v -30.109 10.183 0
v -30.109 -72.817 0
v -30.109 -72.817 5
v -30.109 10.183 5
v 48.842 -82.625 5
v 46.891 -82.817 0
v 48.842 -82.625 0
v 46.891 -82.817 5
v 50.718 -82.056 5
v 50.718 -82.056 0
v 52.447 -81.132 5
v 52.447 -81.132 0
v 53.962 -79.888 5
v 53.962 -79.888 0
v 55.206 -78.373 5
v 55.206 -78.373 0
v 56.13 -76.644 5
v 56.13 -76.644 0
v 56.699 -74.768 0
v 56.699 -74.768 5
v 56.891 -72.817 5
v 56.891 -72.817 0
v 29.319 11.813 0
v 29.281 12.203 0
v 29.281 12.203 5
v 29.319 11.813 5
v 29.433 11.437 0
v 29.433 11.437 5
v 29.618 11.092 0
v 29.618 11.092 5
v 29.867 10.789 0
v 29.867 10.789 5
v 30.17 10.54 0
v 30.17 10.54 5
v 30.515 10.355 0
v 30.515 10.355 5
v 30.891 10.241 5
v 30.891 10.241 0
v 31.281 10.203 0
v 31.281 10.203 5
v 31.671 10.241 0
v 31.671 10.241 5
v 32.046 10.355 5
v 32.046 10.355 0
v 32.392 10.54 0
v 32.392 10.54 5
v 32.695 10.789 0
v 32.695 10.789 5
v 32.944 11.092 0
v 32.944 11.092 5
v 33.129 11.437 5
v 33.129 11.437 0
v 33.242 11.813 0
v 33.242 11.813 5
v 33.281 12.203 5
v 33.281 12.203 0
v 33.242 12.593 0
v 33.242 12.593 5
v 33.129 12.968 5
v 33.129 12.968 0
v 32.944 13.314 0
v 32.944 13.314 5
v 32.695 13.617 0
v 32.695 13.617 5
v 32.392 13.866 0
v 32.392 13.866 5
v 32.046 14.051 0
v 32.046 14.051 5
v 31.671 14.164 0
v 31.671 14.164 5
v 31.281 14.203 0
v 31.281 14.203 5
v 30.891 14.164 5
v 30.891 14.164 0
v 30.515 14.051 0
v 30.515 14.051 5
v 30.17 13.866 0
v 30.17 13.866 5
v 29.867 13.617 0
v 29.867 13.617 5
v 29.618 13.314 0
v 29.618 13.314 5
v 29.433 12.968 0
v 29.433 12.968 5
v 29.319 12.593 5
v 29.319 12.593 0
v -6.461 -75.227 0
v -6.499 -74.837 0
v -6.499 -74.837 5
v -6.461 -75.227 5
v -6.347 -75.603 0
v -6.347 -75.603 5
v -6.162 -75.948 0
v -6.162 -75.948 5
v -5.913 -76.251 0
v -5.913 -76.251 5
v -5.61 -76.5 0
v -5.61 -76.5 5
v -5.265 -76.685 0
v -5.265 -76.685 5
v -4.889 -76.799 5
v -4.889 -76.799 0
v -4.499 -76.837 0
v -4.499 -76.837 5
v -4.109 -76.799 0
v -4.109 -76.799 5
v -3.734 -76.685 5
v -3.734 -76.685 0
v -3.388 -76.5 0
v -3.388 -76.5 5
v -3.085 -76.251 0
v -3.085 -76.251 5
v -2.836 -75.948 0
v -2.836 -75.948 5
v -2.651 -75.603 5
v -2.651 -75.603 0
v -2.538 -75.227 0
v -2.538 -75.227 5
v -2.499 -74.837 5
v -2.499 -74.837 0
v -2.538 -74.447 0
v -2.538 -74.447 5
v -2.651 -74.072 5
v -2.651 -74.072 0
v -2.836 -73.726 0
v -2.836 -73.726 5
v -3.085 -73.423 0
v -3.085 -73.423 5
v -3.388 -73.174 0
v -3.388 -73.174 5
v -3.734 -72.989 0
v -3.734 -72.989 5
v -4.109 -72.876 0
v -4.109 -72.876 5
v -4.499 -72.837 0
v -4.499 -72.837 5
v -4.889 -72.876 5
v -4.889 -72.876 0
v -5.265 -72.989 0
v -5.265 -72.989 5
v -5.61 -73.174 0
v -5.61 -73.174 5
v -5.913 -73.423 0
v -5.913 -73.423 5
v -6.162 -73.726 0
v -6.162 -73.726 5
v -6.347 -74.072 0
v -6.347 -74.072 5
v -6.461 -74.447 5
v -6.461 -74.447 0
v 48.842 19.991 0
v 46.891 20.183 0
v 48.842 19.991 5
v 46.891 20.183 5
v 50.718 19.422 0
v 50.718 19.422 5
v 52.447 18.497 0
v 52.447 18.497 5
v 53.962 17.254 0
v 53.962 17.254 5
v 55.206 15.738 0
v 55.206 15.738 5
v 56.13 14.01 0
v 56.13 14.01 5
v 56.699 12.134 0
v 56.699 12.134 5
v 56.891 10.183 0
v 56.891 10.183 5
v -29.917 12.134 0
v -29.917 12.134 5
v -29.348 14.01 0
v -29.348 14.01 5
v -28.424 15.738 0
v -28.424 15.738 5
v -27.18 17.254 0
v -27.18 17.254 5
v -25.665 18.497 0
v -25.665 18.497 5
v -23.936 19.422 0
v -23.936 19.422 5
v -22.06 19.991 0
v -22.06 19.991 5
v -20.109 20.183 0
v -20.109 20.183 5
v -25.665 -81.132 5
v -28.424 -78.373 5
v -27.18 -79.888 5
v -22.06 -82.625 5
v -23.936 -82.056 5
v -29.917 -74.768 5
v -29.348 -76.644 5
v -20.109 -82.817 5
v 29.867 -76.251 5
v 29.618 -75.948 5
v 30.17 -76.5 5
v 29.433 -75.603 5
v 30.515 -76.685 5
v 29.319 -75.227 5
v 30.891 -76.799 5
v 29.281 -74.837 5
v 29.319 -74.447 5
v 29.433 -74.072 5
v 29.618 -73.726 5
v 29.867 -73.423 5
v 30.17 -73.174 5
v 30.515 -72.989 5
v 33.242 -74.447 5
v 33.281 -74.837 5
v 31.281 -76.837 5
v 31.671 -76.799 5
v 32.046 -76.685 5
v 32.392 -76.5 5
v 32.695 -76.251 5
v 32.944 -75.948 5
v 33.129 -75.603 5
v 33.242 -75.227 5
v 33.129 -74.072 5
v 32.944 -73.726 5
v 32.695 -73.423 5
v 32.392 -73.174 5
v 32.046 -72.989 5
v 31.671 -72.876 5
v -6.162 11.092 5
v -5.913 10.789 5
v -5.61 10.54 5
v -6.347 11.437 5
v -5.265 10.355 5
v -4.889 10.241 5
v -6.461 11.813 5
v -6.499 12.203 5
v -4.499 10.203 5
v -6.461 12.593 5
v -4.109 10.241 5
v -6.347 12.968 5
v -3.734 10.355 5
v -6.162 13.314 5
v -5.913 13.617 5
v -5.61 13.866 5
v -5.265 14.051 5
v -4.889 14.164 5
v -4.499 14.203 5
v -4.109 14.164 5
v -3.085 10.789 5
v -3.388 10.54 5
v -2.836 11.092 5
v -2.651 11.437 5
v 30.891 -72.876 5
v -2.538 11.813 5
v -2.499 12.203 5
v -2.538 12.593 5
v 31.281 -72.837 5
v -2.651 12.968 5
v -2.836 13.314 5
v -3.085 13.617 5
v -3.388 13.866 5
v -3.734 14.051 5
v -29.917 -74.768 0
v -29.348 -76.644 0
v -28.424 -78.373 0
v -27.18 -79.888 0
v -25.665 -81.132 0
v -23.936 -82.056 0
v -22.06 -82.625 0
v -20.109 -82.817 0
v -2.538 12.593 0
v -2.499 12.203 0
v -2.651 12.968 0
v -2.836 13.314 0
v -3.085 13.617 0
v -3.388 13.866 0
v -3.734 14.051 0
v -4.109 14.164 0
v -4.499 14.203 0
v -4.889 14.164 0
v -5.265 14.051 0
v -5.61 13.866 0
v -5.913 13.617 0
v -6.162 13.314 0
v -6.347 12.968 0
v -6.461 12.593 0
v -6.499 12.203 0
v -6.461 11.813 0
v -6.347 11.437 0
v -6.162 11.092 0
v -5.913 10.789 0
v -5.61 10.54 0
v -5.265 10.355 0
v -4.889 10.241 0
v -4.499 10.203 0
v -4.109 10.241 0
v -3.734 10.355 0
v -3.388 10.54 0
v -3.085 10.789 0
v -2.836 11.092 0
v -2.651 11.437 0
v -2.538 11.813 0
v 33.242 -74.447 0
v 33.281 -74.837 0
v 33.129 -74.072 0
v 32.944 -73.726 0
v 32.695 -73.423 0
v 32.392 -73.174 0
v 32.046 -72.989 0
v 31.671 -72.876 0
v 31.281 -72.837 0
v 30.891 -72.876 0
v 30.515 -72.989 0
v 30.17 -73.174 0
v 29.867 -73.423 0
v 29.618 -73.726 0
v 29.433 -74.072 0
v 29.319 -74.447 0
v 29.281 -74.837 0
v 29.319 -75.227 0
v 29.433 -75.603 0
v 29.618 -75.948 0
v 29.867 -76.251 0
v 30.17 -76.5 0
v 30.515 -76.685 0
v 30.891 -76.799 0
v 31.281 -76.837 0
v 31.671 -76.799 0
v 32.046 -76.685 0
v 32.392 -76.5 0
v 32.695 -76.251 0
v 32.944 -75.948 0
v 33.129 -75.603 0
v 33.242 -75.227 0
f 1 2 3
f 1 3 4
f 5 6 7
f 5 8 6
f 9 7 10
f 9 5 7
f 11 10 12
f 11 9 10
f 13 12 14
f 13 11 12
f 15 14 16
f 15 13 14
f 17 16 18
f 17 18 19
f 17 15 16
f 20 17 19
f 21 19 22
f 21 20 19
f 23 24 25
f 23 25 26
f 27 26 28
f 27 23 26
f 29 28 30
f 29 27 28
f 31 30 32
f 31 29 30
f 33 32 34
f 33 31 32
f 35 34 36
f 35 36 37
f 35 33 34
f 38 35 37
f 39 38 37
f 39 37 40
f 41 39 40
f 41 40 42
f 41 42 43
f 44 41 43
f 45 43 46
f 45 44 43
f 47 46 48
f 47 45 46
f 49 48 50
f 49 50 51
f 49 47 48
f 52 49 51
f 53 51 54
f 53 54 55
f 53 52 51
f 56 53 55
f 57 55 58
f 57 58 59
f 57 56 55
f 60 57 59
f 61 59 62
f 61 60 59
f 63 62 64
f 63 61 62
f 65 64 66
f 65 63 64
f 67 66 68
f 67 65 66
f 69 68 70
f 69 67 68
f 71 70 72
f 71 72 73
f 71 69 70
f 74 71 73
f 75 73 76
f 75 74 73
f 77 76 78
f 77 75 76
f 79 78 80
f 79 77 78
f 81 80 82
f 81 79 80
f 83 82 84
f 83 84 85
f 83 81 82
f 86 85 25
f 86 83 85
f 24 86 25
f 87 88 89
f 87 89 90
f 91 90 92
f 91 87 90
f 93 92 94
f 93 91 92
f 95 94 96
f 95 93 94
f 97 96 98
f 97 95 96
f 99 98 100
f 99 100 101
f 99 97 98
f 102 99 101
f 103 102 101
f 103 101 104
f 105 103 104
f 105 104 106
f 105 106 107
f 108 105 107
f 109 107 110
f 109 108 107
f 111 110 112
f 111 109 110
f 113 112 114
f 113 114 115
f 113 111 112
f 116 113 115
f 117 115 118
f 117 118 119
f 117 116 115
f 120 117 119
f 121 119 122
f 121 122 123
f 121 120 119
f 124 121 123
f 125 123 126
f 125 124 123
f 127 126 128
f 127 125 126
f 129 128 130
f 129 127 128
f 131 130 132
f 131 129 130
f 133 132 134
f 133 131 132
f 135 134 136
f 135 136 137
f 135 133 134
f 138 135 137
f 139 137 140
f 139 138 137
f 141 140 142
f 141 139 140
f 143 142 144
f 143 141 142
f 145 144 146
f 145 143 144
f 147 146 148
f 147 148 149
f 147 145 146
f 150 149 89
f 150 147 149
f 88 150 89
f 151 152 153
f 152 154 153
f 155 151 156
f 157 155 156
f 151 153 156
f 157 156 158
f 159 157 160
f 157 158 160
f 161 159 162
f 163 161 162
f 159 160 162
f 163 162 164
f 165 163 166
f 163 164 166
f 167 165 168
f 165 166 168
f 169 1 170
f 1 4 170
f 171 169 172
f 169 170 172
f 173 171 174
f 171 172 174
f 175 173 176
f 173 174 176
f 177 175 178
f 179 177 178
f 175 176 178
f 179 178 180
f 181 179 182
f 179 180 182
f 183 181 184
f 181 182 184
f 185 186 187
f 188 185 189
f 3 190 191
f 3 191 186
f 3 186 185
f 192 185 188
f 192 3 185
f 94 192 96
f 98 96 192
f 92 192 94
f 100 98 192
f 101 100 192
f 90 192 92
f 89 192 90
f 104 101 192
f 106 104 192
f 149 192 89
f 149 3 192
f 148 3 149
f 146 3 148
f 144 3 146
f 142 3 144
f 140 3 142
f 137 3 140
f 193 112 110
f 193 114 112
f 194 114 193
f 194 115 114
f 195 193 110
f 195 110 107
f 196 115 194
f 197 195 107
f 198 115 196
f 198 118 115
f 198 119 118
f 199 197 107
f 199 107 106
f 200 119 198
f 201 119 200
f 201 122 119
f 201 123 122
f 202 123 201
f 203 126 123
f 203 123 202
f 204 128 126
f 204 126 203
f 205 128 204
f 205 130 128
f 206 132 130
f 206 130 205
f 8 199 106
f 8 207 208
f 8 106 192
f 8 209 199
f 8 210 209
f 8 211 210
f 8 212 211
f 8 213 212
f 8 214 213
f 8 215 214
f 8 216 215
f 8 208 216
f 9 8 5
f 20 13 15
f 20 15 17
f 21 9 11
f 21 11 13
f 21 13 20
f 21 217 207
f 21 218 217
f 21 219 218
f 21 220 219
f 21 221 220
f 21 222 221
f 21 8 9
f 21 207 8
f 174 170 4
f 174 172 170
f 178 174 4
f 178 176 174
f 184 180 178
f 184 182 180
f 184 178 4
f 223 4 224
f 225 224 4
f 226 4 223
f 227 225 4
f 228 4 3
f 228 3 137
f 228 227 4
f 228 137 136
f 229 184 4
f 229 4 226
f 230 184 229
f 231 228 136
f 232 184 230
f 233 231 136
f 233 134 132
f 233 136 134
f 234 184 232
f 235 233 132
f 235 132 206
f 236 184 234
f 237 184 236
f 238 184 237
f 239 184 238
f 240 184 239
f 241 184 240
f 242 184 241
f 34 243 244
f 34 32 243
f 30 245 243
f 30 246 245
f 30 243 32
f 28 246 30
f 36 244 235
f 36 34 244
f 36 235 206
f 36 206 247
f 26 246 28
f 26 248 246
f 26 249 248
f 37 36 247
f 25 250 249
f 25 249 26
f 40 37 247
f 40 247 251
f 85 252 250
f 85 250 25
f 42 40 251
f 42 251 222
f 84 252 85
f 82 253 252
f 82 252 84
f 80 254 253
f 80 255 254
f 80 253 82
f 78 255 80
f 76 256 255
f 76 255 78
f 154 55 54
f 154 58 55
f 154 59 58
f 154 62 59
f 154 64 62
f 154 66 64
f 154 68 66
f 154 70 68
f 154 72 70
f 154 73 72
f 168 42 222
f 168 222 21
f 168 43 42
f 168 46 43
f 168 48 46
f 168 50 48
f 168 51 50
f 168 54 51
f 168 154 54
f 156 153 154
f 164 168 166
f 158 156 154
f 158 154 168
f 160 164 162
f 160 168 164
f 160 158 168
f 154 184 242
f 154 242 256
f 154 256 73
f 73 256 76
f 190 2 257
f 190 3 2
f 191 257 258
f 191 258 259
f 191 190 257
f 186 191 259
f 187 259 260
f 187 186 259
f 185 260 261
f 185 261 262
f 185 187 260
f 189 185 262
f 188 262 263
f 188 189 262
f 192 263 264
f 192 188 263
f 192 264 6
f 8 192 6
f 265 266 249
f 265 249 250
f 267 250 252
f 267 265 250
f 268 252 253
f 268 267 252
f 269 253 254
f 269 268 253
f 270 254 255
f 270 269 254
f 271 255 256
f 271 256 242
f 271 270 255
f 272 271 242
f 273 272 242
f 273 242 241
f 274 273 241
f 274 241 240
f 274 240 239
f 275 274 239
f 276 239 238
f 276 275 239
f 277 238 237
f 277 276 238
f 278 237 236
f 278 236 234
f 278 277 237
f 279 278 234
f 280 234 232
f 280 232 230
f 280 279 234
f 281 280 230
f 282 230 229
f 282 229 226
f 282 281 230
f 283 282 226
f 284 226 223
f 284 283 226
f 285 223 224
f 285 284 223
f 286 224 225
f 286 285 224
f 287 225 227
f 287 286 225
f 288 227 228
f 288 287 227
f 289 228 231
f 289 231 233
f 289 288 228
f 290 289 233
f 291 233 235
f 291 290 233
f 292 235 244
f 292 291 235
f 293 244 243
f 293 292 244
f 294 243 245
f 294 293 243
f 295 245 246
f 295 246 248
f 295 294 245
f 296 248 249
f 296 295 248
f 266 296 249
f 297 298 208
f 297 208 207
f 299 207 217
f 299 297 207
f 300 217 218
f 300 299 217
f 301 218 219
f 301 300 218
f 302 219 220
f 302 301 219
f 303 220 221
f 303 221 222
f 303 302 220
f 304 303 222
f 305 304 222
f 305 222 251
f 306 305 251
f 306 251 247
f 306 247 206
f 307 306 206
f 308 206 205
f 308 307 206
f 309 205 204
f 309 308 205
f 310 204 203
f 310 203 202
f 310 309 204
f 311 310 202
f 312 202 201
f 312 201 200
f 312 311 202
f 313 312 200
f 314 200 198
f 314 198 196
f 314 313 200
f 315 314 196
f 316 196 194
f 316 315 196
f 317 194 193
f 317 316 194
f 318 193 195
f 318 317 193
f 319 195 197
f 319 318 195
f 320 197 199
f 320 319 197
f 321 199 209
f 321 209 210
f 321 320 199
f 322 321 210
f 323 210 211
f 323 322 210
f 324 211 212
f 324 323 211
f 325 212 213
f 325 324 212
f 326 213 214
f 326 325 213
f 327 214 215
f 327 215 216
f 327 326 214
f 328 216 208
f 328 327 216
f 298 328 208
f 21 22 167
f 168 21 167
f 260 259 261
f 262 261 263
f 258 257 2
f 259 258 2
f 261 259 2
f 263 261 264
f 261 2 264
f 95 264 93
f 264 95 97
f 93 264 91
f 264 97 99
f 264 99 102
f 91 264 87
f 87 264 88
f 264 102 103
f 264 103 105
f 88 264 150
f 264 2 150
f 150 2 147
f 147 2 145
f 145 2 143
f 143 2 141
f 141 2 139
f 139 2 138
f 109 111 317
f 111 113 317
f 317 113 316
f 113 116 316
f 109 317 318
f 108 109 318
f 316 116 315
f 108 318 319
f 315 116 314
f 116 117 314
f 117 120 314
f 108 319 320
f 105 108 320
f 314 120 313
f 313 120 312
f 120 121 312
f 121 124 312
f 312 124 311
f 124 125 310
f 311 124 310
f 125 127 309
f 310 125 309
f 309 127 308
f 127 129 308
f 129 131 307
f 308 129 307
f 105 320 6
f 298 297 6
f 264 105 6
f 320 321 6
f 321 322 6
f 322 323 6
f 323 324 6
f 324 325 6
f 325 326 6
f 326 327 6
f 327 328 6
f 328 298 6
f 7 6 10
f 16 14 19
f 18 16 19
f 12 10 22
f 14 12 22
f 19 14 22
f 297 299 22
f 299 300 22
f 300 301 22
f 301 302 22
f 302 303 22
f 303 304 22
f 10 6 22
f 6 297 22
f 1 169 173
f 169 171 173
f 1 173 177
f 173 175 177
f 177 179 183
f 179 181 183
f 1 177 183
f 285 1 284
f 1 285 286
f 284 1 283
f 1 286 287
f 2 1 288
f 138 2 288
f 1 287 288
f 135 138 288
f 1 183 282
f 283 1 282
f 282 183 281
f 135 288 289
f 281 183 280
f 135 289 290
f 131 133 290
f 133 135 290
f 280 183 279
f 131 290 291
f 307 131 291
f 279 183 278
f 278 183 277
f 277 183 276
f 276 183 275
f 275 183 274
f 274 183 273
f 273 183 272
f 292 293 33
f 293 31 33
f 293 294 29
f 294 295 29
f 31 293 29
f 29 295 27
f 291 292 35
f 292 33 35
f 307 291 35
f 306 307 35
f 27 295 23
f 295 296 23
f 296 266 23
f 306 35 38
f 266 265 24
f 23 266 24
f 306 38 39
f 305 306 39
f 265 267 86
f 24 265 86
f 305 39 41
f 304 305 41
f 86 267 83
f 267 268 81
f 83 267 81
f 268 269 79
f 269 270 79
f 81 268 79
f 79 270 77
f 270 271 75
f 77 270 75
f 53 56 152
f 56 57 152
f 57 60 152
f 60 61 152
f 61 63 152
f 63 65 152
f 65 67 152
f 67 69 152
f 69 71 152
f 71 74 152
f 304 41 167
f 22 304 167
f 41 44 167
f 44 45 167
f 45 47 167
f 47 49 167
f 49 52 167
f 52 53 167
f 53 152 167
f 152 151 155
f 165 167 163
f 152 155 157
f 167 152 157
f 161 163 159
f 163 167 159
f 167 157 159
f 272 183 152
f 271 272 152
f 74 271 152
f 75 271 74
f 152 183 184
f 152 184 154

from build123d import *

# Parameters (mm, degrees)
CROQUIS1_W              = 87
CROQUIS1_H              = 103
CROQUIS1_R              = 2
SALIENTE_EXTRUIR1_DEPTH = 5
REDONDEO1_R             = 10


with BuildPart() as part:
    # Croquis1 → Saliente-Extruir1 (new body)
    with BuildSketch(Plane.XY):
        with Locations((13.390838462, -31.317238422)):
            Rectangle(CROQUIS1_W, CROQUIS1_H)
        with Locations((-4.499161538, 12.202761578)):
            Circle(CROQUIS1_R, mode=Mode.SUBTRACT)
        with Locations(Location((31.280838462, 12.202761578, 0), (0, 0, 180))):
            Circle(CROQUIS1_R, mode=Mode.SUBTRACT)
        with Locations((31.280838462, -74.837238422)):
            Circle(CROQUIS1_R, mode=Mode.SUBTRACT)
        with Locations(Location((-4.499161538, -74.837238422, 0), (0, 0, 180))):
            Circle(CROQUIS1_R, mode=Mode.SUBTRACT)
    extrude(amount=SALIENTE_EXTRUIR1_DEPTH)

    # Redondeo1
    redondeo1_edges = [part.edges().sort_by_distance(p)[0] for p in [
        (-30.109161538, 20.182761578, 2.5),
        (56.890838462, 20.182761578, 2.5),
        (56.890838462, -82.817238422, 2.5),
        (-30.109161538, -82.817238422, 2.5),
    ]]
    fillet(redondeo1_edges, radius=REDONDEO1_R)


solid = part.part
